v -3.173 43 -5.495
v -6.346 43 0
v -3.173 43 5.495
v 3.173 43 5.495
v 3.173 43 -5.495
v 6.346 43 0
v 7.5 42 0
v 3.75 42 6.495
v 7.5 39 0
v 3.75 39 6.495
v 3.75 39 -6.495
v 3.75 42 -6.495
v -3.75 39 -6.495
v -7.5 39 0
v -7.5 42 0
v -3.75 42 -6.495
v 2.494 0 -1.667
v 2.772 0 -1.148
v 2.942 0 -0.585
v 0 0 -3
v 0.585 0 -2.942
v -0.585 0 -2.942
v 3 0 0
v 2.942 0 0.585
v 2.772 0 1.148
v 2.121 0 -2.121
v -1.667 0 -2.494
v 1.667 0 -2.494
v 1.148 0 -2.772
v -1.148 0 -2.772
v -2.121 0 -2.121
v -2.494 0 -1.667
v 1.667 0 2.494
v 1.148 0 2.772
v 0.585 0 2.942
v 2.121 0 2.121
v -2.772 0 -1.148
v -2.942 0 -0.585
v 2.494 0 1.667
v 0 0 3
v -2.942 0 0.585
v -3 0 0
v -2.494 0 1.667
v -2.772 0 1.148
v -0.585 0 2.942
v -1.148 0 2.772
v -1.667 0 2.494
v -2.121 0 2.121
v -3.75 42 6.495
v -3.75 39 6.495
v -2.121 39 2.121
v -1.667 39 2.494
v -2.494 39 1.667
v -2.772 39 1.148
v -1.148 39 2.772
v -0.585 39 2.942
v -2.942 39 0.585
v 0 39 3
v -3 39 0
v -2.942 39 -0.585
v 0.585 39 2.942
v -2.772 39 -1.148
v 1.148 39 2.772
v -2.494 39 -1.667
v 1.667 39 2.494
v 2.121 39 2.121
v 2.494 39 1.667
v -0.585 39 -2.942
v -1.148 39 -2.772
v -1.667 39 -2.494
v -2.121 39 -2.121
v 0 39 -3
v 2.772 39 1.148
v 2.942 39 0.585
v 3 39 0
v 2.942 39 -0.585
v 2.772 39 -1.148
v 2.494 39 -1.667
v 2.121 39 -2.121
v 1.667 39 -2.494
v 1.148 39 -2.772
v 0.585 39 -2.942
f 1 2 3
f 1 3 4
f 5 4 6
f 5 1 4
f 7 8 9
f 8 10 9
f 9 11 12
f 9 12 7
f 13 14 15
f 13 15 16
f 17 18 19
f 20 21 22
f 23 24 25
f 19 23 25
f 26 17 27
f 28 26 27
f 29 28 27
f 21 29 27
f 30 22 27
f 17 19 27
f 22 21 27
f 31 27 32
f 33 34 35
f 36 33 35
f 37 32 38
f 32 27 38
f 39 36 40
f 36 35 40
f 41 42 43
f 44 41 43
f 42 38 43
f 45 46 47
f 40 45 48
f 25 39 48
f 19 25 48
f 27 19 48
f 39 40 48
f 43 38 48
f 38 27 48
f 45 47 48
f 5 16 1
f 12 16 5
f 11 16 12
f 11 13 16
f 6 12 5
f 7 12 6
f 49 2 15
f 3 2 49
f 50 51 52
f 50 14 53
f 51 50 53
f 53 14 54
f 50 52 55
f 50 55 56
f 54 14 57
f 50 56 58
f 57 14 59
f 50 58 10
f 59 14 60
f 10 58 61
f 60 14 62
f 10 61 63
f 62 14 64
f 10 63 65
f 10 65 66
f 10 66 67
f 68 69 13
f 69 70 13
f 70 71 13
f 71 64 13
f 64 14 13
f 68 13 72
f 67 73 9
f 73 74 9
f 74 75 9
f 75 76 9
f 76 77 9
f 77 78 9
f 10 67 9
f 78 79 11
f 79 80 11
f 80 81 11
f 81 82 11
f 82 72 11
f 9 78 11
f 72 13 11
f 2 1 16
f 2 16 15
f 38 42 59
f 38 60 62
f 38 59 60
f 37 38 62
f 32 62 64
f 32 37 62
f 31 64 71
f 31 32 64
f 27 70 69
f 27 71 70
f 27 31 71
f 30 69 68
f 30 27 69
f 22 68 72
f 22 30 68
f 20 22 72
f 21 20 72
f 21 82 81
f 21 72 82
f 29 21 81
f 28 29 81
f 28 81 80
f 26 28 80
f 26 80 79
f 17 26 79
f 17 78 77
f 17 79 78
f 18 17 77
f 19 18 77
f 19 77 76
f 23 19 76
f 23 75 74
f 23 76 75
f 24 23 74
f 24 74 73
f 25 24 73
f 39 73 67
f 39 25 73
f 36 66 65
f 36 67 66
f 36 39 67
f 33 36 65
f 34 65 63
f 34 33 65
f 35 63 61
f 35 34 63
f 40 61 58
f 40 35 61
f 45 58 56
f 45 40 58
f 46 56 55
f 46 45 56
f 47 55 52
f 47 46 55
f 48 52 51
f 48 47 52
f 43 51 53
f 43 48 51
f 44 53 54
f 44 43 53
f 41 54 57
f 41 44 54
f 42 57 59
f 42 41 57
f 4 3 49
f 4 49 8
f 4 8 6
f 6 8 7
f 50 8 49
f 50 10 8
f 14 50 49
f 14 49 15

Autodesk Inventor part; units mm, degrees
ref_plane "YZ Plane" through (0, 0, 0) normal (1, 0, 0) x (0, 1, 0)
ref_plane "XZ Plane" through (0, 0, 0) normal (0, 1, 0) x (-1, 0, 0)
ref_plane "XY Plane" through (0, 0, 0) normal (0, 0, 1) x (1, 0, 0)
sketch "Sketch1" plane through (0, 0, 0) normal (0, 1, 0) x (-1, 0, 0)
  circle A0 centre (0, 0) radius 3
  dimension "d0" = 6
extrude "Extrusion1" add sketch "Sketch1" along normal blind 39
sketch "Sketch2" plane through (0, 39, 0) normal (0, 1, 0) x (1, 0, 0)
  line L0 (-3.7501, -6.4954) -> (-7.5003, 0)
  line L1 (-7.5003, 0) -> (-3.7501, 6.4954)
  line L2 (-7.5003, 0) -> (0, 0) construction
  line L3 (-3.7501, 6.4954) -> (3.7501, 6.4954)
  line L4 (3.7501, 6.4954) -> (7.5003, 0)
  line L5 (3.7501, -6.4954) -> (7.5003, 0)
  line L6 (3.7501, -6.4954) -> (-3.7501, 6.4954) construction
  line L7 (3.7501, 6.4954) -> (-3.7501, -6.4954) construction
  line L8 (7.5003, 0) -> (-7.5003, 0) construction
  line L9 (3.7501, -6.4954) -> (-3.7501, -6.4954)
  dimension "d13" = 7.5003
  dimension "d18" = 7.5003
  dimension "d19" = 60
  dimension "d20" = 7.5003
  dimension "d21" = 120
  dimension "d22" = 120
extrude "Extrusion2" add sketch "Sketch2" along normal blind 4
thread "Thread2" size "1/4-20 UNC" class "2A" standard "ANSI Unified Screw Threads" full length
chamfer "Chamfer1" distance 1 angle 45 6 edges at (0, 43, 6.4954) (5.6252, 43, 3.2477) (5.6252, 43, -3.2477) (0, 43, -6.4954) (-5.6252, 43, -3.2477) (-5.6252, 43, 3.2477)
equation "\"d13\" = d9"
equation "\"d18\" = d13"
equation "\"d20\" = d9"
equation "\"d9\" = 7.500278"
properties part number "Bolt" material "Aluminum 6061-AHC"
